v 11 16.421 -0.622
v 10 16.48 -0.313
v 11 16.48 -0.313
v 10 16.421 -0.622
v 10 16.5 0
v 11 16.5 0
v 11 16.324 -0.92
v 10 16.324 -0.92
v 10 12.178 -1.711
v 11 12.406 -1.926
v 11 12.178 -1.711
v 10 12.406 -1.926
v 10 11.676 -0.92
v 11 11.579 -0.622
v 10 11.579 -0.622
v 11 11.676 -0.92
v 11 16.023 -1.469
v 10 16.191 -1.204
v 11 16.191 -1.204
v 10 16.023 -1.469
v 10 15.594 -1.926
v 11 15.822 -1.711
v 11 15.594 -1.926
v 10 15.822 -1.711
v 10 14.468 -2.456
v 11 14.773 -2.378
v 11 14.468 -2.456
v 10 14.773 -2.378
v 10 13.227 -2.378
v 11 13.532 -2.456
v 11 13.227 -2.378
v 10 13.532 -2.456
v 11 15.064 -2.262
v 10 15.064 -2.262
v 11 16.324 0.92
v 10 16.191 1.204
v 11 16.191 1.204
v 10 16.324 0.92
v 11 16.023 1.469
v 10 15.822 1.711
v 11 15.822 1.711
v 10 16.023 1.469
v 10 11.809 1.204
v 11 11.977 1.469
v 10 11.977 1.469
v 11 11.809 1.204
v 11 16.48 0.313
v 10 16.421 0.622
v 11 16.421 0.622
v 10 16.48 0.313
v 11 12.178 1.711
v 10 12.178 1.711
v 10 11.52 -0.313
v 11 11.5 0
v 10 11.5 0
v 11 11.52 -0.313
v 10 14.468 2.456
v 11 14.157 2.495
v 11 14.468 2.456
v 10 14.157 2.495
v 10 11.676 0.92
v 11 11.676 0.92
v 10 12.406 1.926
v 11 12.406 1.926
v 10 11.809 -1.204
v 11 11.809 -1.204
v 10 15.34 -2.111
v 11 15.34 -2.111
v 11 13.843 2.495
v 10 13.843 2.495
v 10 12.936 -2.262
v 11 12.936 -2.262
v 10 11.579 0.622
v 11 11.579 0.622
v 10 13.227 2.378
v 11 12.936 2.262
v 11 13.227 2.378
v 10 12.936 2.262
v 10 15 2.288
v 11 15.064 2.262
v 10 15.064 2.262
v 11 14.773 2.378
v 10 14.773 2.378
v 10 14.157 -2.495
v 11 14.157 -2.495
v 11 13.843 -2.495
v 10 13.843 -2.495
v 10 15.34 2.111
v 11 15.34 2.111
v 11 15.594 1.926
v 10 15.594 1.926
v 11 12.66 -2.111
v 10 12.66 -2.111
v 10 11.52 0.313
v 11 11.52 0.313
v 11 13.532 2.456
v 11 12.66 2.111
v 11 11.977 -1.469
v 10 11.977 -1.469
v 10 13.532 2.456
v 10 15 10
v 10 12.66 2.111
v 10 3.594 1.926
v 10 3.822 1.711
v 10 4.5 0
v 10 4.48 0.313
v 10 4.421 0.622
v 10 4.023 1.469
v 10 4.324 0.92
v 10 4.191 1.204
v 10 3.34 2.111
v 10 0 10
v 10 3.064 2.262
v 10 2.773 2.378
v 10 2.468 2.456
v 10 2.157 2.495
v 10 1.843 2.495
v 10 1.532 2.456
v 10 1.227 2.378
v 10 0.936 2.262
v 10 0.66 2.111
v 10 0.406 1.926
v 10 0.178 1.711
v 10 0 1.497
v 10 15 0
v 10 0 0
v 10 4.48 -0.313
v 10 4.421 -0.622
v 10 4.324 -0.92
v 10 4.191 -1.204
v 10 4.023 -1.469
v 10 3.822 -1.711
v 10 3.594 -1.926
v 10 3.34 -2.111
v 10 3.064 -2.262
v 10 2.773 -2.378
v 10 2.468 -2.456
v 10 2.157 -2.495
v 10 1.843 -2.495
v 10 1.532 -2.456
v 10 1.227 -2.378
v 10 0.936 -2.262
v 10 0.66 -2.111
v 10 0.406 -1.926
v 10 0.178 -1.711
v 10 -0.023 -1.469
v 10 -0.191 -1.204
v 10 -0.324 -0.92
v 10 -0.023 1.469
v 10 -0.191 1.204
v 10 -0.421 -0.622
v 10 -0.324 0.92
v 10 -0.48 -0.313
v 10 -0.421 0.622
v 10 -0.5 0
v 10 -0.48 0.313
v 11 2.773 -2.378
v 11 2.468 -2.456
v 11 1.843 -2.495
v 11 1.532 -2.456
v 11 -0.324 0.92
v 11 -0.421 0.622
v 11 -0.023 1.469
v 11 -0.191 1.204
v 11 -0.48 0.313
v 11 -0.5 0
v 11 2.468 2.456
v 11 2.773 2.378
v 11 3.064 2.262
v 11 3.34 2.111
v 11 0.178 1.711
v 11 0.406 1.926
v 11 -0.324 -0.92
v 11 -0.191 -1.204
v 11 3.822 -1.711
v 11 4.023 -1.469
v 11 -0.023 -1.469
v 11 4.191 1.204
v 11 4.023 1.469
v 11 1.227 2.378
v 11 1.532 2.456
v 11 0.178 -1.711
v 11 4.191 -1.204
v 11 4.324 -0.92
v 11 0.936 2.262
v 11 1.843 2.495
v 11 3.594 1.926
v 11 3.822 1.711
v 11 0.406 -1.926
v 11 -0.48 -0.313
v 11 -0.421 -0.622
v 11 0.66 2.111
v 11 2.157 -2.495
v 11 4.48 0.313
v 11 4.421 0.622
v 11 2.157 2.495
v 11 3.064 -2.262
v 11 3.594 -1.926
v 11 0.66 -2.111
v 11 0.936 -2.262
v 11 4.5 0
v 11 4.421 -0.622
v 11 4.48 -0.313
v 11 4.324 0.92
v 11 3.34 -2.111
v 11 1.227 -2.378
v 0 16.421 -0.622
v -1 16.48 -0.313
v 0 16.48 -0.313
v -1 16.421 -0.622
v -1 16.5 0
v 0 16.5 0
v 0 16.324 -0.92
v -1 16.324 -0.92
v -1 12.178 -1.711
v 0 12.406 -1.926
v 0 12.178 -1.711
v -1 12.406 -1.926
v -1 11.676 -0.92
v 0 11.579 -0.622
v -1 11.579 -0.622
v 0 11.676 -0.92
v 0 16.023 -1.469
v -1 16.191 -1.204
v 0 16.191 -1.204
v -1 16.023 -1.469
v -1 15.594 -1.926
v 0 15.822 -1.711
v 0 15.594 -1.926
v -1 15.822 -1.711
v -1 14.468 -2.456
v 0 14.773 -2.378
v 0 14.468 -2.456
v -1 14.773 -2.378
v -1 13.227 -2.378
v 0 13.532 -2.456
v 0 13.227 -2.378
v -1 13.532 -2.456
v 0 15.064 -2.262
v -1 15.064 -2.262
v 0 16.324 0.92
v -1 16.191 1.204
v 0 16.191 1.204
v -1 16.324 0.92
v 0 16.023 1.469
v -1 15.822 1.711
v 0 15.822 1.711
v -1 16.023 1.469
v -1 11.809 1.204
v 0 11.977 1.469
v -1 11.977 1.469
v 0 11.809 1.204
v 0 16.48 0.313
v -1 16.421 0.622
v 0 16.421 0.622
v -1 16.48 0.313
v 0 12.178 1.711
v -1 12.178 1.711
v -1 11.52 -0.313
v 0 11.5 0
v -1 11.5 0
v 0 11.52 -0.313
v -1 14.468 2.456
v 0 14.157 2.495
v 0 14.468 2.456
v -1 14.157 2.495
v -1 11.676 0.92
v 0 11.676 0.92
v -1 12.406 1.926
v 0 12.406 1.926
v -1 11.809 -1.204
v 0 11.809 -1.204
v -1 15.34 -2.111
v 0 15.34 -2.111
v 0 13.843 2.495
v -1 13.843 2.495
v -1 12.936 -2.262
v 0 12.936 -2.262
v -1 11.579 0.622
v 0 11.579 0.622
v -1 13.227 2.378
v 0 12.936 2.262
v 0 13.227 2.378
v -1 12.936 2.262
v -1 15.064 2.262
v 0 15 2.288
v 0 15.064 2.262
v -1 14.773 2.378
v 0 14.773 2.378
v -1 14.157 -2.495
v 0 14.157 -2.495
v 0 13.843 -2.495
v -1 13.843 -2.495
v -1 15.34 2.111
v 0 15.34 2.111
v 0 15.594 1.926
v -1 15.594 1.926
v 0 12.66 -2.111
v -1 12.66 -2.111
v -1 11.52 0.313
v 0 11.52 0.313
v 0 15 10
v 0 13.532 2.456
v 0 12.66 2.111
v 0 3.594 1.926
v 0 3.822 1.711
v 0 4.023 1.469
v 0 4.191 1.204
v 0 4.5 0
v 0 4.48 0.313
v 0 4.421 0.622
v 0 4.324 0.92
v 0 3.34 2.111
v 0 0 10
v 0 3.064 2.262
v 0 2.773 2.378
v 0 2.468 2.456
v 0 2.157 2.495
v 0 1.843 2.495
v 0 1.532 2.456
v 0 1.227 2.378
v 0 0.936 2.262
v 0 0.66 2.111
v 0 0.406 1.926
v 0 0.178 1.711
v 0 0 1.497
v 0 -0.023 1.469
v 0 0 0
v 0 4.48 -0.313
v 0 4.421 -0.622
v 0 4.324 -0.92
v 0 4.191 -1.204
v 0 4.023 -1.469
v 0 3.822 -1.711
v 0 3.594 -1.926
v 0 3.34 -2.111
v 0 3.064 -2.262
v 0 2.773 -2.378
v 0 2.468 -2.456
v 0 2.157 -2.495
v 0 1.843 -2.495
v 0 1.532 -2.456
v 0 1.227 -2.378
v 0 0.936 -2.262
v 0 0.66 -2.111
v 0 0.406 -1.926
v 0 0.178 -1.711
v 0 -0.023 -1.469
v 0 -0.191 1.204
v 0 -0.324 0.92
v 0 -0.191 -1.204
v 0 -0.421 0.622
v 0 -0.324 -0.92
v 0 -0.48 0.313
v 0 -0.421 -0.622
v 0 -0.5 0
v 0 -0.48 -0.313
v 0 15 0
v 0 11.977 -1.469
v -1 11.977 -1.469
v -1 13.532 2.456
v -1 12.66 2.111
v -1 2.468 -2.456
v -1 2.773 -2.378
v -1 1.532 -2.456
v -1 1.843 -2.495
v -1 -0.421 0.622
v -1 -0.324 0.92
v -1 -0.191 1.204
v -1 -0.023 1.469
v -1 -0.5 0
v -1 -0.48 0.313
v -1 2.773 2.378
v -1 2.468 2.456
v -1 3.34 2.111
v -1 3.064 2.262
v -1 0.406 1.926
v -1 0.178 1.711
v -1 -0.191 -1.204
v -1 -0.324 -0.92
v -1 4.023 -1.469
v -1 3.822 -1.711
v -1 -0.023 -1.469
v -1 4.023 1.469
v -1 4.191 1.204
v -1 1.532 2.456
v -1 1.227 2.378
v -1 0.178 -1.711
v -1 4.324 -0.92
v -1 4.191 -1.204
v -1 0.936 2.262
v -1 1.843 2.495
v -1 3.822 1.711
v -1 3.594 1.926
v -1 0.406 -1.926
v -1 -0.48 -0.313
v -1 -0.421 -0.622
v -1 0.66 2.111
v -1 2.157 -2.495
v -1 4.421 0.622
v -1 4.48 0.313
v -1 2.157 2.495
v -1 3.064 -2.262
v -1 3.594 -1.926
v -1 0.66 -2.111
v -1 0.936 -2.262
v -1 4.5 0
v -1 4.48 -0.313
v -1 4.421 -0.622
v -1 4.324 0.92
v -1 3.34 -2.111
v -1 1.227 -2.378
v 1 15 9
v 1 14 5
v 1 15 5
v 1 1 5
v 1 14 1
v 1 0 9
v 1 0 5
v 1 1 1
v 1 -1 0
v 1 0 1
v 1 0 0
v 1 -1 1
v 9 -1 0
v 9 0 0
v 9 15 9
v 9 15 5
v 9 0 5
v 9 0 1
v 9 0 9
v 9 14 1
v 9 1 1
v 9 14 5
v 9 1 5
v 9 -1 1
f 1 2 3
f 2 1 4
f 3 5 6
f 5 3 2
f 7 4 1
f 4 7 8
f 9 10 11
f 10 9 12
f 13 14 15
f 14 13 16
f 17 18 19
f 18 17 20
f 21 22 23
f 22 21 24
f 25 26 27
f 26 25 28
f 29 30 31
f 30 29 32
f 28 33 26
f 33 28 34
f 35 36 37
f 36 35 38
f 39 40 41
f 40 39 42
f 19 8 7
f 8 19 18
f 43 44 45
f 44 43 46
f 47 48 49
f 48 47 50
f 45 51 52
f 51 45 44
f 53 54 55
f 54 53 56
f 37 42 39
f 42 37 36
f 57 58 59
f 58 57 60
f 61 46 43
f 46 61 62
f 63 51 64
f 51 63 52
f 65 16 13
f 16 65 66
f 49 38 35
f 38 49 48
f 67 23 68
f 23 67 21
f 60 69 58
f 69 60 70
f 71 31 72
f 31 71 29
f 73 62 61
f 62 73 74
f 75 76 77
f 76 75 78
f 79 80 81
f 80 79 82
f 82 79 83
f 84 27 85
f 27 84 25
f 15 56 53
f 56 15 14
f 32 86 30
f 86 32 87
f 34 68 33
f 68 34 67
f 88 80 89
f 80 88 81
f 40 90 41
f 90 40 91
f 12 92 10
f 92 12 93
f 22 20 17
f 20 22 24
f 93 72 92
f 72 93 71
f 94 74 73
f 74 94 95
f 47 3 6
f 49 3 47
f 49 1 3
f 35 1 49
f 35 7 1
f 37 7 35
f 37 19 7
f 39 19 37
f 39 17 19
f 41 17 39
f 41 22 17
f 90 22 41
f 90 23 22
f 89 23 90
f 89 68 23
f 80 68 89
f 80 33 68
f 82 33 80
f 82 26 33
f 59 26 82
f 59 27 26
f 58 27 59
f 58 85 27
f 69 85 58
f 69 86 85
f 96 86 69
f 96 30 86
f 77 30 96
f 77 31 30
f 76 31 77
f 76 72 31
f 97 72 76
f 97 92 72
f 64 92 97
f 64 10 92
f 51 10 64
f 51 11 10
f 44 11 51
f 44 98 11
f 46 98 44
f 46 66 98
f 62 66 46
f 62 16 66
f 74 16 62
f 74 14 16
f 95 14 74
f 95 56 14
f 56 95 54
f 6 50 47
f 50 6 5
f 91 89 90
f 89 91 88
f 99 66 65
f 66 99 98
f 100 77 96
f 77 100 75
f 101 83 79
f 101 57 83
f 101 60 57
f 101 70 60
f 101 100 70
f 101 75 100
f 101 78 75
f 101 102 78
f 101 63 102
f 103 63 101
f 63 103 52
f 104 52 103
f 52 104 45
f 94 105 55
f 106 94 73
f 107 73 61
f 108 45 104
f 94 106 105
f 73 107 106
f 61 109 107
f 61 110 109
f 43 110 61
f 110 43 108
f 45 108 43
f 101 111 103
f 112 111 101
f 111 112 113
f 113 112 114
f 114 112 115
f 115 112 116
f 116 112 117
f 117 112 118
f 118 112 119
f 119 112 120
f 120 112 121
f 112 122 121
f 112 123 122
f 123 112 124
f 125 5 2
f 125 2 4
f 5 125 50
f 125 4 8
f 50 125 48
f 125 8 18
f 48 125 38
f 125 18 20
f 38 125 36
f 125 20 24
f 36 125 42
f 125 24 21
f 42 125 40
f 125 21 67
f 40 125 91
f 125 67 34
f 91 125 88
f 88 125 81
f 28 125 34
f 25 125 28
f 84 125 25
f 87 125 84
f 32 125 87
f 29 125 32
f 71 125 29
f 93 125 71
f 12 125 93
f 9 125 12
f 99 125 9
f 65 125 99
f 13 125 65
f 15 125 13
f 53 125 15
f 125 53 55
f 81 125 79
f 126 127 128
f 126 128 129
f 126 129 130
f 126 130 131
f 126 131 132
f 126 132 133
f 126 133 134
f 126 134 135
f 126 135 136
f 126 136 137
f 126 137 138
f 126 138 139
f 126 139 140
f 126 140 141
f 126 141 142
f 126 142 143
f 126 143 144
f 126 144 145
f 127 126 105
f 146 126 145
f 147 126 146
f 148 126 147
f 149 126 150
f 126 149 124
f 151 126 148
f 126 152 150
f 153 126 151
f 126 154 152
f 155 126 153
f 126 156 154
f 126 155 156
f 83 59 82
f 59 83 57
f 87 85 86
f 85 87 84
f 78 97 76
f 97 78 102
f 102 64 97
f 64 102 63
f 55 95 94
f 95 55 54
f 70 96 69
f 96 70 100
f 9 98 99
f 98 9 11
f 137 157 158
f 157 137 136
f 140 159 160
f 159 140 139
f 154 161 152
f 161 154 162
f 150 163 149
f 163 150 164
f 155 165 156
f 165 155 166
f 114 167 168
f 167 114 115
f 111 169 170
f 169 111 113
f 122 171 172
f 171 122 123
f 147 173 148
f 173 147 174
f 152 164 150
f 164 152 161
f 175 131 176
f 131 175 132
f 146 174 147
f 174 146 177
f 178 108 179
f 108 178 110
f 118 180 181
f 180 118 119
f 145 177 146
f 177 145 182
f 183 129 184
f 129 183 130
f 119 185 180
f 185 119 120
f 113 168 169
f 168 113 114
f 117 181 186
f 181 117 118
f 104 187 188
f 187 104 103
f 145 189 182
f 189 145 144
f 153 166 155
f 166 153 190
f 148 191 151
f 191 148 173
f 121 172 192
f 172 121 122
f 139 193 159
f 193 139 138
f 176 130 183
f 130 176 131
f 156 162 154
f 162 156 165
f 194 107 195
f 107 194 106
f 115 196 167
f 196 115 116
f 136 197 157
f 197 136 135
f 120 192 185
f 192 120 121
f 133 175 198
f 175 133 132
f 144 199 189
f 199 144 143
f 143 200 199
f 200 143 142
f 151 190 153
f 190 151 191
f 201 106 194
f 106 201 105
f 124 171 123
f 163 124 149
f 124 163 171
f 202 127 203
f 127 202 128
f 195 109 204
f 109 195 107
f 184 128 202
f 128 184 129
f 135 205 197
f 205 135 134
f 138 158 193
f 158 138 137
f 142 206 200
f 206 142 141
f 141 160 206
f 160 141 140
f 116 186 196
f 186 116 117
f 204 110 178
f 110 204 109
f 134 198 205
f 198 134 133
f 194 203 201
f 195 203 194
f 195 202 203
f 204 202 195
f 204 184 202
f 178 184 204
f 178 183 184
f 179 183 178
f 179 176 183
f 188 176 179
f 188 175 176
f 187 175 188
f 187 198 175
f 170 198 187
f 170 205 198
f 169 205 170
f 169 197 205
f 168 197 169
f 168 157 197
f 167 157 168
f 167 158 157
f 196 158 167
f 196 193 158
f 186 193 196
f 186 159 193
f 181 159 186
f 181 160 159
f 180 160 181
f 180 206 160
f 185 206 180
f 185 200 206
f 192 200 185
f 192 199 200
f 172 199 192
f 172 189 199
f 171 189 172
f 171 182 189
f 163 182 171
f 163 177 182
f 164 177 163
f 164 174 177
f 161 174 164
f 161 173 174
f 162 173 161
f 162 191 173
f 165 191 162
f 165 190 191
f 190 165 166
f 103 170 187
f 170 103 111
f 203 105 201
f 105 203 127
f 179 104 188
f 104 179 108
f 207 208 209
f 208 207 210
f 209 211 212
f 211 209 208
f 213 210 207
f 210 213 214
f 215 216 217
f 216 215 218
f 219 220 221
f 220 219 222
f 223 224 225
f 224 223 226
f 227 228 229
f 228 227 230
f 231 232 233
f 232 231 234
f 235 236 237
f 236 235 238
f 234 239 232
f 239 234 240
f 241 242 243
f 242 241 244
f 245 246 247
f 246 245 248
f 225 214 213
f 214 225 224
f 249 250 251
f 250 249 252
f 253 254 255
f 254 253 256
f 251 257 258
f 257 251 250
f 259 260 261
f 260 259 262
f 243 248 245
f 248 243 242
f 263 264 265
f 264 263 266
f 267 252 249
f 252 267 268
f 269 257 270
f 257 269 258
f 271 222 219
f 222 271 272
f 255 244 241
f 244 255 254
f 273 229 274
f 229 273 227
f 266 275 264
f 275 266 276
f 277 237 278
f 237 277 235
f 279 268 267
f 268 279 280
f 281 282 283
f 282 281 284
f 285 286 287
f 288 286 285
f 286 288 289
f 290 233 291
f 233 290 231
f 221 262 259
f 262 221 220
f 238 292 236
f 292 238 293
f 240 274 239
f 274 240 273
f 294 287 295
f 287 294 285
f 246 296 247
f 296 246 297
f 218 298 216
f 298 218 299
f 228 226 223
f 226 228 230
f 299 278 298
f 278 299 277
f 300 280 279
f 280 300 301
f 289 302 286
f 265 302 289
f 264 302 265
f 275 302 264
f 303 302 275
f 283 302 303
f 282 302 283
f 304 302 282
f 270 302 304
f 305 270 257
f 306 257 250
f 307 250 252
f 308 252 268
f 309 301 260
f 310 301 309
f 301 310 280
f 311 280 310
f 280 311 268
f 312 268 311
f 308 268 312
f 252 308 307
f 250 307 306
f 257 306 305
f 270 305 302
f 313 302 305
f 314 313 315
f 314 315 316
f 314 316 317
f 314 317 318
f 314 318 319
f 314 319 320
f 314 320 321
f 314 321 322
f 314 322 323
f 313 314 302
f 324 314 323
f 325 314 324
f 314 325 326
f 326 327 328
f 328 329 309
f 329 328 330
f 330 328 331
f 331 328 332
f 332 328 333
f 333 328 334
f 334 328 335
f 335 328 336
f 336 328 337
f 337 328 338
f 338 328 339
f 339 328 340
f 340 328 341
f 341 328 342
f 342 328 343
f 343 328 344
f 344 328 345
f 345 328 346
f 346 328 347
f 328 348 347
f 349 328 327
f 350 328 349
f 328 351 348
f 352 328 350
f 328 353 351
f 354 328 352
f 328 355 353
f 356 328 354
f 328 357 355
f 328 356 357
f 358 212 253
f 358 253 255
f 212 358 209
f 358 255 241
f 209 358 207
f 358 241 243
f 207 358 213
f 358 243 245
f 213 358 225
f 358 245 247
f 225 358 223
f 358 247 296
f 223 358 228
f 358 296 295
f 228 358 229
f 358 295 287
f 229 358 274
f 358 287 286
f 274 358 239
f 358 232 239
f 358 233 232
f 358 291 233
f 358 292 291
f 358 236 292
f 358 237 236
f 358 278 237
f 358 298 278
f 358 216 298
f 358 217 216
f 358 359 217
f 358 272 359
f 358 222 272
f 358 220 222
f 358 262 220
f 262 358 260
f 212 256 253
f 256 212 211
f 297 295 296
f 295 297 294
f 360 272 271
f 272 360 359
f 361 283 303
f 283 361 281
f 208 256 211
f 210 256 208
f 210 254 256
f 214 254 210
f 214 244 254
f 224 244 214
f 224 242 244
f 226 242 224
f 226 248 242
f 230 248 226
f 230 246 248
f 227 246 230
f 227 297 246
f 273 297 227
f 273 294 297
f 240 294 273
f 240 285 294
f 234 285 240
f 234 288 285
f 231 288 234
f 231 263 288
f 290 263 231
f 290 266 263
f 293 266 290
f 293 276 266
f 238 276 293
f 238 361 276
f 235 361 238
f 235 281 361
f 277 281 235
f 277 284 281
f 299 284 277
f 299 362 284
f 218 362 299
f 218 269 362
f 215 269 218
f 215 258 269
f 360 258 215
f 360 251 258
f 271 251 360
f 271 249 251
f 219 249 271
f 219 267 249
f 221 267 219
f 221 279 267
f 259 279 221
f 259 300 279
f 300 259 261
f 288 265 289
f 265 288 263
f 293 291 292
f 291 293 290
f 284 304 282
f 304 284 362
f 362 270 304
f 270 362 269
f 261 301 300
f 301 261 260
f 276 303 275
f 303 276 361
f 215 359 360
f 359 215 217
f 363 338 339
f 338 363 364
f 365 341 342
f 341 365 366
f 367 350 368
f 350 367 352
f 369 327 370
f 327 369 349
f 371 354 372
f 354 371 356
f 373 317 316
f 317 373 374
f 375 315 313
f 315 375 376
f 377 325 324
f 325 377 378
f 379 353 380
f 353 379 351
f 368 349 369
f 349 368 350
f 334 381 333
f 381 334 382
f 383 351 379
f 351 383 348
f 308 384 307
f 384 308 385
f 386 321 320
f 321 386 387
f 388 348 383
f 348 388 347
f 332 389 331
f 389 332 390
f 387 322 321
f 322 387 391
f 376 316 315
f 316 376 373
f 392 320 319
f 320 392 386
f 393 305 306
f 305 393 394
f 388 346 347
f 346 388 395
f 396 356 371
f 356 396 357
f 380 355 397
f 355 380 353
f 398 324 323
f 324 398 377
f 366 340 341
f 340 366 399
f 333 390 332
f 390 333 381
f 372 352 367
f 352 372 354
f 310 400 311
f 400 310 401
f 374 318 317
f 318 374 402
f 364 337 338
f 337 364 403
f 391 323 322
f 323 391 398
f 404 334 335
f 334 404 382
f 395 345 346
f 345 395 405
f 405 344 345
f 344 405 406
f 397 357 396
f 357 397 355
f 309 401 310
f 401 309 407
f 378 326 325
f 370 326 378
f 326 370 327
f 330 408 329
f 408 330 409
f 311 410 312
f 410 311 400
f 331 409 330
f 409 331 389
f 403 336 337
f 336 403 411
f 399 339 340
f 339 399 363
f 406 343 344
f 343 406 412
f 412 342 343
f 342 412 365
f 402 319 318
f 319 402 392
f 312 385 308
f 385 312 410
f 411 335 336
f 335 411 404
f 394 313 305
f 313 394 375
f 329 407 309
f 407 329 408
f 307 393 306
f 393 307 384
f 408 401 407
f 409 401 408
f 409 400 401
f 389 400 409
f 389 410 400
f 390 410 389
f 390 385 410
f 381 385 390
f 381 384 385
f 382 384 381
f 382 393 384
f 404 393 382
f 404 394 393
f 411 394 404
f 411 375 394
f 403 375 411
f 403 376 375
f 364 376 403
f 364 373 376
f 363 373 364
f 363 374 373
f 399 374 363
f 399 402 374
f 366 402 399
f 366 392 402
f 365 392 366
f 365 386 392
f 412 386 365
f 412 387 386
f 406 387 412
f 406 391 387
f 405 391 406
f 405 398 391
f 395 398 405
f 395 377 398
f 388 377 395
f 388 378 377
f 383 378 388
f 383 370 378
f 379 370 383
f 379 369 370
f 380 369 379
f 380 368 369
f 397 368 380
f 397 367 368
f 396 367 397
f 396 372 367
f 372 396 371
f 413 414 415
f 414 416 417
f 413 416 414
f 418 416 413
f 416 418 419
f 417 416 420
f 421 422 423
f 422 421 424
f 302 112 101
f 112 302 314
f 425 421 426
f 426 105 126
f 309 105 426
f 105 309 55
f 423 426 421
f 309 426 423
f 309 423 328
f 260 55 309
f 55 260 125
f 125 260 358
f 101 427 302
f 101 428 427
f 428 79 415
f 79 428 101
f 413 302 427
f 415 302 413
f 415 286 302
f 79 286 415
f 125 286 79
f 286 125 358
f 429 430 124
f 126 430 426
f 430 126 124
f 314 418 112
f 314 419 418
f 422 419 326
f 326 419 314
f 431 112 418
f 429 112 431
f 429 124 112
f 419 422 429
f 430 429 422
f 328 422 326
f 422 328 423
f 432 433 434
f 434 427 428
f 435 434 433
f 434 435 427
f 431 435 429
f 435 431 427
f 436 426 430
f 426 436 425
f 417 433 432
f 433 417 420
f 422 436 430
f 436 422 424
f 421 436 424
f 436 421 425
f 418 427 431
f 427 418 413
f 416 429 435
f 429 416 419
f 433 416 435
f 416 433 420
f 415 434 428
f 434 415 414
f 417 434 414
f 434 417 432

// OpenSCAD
$fn=50;
//Left
cube([1, 15, 10]);
//Right-TRANSLATE
#translate([9,0,0])
 cube([1, 15, 10]);
//Bottom-TRANSLATE
translate([1,-1,0])
 cube([8, 16, 1]);
//Top-TRANSLATE
translate([1, 0, 9])
 cube([8, 15, 1]);
//Front-TRANSLATE
#translate([1, 0, 1])
 cube([8, 1, 4]);
//Back-TRANSLATE
translate([1, 14, 1])
 cube([8, 1, 4]);
//ROTATE 
//RightCircle-TRANSLATE-FOR (I wanted to distinguish it back and forth.)
translate([10, 8, 0]){
    rotate(a=270, v=[0, 1, 0]) 
    for(ball=[90:180:360]) {
        rotate([0, 0, ball])
        translate([6, 0, -1])
        cylinder( r1=2.5, r2=2.5, h=1);
    }
}
//LeftCircle-TRANSLATE-FOR
translate([-1, 8, 0]){
    rotate(a=270, v=[0, 1, 0])
    for(ball=[90:180:360]) {
        rotate([0, 0, ball])
        translate([6, 0, -1])
        cylinder( r1=2.5, r2=2.5, h=1);
    }
}
